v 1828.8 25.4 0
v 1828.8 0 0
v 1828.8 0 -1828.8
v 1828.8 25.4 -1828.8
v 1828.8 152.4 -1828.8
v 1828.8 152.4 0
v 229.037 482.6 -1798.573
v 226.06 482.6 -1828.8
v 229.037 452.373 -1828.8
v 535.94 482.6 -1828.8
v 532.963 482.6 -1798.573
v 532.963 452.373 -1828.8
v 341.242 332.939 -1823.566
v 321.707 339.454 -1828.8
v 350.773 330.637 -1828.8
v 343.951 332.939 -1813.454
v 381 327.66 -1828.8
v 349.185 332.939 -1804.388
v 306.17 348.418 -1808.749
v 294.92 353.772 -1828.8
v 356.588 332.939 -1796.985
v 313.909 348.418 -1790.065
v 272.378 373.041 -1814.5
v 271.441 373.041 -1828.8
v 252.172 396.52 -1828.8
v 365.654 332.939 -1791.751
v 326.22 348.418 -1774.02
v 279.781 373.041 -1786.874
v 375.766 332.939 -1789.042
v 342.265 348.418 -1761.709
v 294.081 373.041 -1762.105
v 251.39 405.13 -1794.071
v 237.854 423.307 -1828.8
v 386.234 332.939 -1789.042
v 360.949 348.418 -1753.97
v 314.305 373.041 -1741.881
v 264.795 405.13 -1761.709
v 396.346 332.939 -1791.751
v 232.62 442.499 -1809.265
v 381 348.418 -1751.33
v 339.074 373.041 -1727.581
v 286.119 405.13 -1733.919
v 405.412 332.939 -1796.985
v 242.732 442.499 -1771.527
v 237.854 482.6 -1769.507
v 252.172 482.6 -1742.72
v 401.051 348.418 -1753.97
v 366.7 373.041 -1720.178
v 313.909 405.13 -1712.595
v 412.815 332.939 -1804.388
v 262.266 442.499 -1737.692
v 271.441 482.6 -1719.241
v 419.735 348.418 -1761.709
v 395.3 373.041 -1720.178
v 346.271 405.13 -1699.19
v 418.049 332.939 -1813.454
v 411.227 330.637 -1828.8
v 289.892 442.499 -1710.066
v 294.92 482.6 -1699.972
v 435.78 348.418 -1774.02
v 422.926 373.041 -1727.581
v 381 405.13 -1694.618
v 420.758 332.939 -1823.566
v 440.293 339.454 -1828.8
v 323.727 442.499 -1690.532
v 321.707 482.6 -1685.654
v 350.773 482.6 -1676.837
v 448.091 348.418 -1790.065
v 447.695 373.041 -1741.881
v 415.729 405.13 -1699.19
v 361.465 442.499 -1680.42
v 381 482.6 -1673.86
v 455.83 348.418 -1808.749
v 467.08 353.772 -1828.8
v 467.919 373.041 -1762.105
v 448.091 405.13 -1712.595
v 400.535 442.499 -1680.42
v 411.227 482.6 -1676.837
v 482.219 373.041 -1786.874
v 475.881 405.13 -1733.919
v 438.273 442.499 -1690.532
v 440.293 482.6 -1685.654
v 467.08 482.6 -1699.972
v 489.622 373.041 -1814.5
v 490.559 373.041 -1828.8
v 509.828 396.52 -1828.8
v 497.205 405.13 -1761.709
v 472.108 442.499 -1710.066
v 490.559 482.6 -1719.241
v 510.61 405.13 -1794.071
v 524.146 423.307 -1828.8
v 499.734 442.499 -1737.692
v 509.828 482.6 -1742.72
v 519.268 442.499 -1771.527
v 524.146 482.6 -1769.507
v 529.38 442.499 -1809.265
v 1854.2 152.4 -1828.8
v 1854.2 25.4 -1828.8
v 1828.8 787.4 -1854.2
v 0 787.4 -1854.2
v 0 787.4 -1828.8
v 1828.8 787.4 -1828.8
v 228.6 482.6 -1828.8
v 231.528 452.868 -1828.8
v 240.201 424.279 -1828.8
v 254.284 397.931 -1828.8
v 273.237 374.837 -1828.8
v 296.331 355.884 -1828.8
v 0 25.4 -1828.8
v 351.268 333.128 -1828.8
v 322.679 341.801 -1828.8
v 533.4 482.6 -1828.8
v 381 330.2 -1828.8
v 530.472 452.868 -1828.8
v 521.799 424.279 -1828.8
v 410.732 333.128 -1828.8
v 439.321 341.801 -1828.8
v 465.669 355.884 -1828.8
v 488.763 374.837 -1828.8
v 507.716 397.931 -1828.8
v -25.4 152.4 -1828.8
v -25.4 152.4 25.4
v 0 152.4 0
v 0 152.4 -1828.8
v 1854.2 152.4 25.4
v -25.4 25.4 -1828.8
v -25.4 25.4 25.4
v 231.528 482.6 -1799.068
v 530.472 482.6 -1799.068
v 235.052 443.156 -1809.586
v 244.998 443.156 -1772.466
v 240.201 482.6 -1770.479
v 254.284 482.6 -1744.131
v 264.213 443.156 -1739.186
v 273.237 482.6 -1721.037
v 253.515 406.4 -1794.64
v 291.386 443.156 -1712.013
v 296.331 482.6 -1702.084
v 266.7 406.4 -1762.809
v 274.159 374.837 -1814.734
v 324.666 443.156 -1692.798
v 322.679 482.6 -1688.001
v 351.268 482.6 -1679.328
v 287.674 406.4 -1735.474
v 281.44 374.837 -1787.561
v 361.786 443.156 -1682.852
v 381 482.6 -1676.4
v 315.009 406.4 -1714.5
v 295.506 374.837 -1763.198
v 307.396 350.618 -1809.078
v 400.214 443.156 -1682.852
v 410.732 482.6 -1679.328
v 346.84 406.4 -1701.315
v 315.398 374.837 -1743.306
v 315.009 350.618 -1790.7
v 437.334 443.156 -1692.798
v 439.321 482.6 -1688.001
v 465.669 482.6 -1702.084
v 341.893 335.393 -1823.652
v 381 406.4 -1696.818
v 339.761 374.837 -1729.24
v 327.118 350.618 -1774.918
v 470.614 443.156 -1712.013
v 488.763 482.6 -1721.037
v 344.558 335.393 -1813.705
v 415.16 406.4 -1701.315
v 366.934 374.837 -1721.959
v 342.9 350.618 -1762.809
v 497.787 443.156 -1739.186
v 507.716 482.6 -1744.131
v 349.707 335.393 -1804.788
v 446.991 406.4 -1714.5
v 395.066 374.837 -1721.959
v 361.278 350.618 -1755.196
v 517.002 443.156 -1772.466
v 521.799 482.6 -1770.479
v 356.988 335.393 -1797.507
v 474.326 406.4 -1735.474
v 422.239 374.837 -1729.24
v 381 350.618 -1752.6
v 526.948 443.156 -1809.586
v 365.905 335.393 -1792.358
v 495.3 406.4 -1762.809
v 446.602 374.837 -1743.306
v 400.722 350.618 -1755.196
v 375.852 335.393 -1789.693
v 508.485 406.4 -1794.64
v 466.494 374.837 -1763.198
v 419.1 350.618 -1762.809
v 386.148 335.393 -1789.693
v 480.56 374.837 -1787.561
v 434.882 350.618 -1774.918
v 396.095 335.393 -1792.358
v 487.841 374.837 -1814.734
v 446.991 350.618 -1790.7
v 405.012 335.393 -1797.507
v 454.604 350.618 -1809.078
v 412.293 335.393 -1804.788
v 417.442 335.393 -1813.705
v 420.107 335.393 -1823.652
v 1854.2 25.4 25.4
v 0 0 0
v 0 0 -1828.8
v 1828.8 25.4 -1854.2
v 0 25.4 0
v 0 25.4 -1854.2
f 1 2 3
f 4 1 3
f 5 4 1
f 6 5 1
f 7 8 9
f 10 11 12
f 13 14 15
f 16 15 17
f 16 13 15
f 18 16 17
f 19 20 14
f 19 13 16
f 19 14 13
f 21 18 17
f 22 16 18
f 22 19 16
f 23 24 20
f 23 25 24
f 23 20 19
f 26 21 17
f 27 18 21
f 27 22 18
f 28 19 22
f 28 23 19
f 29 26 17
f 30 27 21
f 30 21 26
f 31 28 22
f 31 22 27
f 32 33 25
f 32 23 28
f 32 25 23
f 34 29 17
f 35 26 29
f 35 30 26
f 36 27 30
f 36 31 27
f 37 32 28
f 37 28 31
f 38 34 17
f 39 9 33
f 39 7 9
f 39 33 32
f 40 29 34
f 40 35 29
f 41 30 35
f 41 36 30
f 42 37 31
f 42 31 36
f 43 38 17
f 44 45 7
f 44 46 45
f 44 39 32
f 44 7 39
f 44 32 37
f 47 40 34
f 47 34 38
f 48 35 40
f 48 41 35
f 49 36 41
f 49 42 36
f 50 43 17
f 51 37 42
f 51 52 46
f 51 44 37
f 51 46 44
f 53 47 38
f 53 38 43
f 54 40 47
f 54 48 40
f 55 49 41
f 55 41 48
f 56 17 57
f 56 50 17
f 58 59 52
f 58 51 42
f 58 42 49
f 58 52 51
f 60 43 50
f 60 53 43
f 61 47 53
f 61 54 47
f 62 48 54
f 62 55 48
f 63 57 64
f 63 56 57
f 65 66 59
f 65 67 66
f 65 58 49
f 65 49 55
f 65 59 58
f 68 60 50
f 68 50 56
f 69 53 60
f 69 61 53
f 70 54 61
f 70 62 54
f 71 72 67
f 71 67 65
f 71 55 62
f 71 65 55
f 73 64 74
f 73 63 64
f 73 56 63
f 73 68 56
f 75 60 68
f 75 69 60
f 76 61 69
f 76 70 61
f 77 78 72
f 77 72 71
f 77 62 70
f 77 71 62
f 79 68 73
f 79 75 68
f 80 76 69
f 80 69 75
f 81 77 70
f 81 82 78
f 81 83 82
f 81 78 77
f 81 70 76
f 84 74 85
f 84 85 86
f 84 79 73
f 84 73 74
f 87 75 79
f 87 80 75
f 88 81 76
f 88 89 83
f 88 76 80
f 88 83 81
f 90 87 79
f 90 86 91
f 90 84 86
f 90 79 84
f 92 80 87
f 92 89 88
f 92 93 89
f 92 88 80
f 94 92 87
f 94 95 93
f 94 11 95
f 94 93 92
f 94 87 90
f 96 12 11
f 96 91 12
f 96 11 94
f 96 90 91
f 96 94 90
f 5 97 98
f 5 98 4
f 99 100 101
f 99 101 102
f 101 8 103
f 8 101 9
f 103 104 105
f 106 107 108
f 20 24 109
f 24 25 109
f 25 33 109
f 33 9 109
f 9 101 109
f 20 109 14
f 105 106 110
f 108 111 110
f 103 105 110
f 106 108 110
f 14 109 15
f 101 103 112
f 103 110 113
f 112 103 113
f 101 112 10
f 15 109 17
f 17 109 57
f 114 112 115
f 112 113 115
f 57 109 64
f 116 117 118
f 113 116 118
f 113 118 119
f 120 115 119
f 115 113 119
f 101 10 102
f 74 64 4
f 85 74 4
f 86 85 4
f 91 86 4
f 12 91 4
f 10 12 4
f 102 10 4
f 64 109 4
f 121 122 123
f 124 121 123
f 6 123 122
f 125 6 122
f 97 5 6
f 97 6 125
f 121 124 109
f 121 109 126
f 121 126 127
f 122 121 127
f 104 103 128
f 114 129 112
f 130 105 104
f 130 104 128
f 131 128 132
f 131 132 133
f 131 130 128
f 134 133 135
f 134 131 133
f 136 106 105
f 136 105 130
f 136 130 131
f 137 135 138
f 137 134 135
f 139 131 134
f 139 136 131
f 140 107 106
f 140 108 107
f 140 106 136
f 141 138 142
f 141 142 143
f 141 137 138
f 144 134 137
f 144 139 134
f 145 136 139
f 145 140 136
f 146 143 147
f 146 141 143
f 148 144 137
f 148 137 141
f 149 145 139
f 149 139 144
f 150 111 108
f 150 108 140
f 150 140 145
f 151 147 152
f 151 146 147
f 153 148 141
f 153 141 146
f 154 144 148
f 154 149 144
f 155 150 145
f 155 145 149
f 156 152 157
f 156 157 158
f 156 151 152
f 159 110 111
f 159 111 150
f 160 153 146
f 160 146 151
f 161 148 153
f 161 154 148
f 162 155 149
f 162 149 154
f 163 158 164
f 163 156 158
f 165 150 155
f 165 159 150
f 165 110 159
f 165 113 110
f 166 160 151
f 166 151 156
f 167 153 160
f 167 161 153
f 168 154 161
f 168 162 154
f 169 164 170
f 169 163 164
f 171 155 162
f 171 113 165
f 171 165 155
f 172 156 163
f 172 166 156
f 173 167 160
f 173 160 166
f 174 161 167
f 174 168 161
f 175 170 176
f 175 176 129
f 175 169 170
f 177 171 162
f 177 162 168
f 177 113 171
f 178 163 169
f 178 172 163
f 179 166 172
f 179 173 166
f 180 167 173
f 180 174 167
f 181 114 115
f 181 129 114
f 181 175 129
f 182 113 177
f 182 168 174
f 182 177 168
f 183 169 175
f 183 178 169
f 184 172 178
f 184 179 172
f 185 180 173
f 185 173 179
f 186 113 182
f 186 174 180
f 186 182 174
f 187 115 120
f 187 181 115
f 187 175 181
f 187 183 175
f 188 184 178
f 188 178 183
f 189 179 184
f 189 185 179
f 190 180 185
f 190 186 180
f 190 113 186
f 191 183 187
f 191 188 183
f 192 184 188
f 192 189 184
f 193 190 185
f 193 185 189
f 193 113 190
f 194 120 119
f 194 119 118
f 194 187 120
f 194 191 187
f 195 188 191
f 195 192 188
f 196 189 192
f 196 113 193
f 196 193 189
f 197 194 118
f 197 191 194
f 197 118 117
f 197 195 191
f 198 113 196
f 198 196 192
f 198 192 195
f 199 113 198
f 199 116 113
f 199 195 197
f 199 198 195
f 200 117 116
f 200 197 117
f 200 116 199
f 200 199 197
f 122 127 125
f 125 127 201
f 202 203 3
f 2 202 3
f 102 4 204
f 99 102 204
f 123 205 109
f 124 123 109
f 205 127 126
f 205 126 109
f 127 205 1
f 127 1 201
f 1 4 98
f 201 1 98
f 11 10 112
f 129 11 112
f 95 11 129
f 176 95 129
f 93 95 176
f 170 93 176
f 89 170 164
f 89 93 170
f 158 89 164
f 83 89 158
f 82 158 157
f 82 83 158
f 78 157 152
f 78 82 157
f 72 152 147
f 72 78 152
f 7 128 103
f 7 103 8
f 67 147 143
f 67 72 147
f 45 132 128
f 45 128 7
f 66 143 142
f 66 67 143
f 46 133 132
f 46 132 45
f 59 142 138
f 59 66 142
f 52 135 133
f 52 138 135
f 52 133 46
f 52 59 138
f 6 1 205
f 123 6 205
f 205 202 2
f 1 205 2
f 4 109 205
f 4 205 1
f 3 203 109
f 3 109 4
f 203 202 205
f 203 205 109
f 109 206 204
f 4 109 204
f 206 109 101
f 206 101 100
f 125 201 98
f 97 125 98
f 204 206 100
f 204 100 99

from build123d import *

# Parameters (mm, degrees)
SKETCH1_W           = 1828.8
SKETCH1_H           = 1828.8
BOSS_EXTRUDE1_DEPTH = 25.4
SKETCH4_W           = 1828.8
SKETCH4_H           = 25.4
BOSS_EXTRUDE2_DEPTH = 762
BOSS_EXTRUDE3_DEPTH = 127
REVOLVE1_ANGLE      = 180


with BuildPart() as part:
    # Sketch1 → Boss-Extrude1 (new body)
    with BuildSketch(Plane(origin=(0, 0, 0), x_dir=(1, 0, 0), z_dir=(0, 1, 0))):
        with Locations((914.4, 914.4)):
            Rectangle(SKETCH1_W, SKETCH1_H)
    extrude(amount=BOSS_EXTRUDE1_DEPTH)


with BuildPart() as body_2:
    # Sketch4 → Boss-Extrude2 (new body)
    with BuildSketch(Plane(origin=(0, 25.4, 0), x_dir=(1, 0, 0), z_dir=(0, 1, 0))):
        with Locations((914.4, 1841.5)):
            Rectangle(SKETCH4_W, SKETCH4_H)
    extrude(amount=BOSS_EXTRUDE2_DEPTH)

    # Sketch6 → Revolve1 (revolve)
    with BuildSketch(Plane.XY.offset(-1828.8)):
        with BuildLine():
            Line((226.06, 482.6), (228.6, 482.6))
            ThreePointArc((228.6, 482.6), (273.236926547, 374.836926547), (381, 330.2))
            Line((381, 330.2), (381, 327.66))
            ThreePointArc((381, 327.66), (271.440875323, 373.040875323), (226.06, 482.6))
        make_face()
    revolve(axis=Axis((381, 330.2, -1828.8), (0, 1, 0)), revolution_arc=REVOLVE1_ANGLE)


with BuildPart() as body_3:
    # Sketch5 → Boss-Extrude3 (new body)
    with BuildSketch(Plane(origin=(0, 25.4, 0), x_dir=(1, 0, 0), z_dir=(0, 1, 0))):
        Polygon((0, 1828.8), (-25.4, 1828.8), (-25.4, -25.4), (1854.2, -25.4), (1854.2, 1828.8), (1828.8, 1828.8), (1828.8, 0), (0, 0), align=None)
    extrude(amount=BOSS_EXTRUDE3_DEPTH)


solid = Compound([part.part, body_2.part, body_3.part])
